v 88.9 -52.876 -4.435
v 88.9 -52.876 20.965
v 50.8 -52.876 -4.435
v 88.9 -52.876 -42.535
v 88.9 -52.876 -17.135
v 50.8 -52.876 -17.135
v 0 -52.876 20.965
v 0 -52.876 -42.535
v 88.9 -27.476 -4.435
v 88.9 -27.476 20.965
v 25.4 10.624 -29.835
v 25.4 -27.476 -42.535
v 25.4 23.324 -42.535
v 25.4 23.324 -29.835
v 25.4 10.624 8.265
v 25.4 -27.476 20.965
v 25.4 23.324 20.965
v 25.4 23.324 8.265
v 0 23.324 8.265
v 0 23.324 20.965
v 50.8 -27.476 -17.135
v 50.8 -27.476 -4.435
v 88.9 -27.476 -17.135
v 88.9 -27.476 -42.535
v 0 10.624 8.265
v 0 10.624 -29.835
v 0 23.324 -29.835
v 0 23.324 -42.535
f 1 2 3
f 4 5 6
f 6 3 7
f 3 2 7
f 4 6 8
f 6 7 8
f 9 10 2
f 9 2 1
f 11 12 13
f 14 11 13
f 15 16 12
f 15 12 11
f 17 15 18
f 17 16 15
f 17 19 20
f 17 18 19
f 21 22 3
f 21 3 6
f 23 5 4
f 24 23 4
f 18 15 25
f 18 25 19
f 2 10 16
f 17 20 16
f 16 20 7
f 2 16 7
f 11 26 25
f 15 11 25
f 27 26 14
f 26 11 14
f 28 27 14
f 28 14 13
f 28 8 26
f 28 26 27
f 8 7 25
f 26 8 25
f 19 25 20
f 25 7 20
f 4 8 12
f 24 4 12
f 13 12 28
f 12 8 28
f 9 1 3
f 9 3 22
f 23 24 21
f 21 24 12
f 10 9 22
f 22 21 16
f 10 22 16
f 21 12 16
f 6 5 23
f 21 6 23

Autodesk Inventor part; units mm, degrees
ref_plane "YZ Plane" through (0, 0, 0) normal (1, 0, 0) x (0, 1, 0)
ref_plane "XZ Plane" through (0, 0, 0) normal (0, 1, 0) x (-1, 0, 0)
ref_plane "XY Plane" through (0, 0, 0) normal (0, 0, 1) x (1, 0, 0)
sketch "Sketch1" plane through (0, 0, 0) normal (1, 0, 0) x (0, 1, 0)
  line L0 (10.6243, 20.9647) -> (-52.8757, 20.9647)
  line L1 (-52.8757, 20.9647) -> (-52.8757, -42.5353)
  line L2 (-52.8757, -42.5353) -> (10.6243, -42.5353)
  line L3 (10.6243, -42.5353) -> (10.6243, 20.9647)
  point P0 (0, 0)
  dimension "d0" = 63.5
  dimension "d1" = 63.5
extrude "Extrusion1" add sketch "Sketch1" along normal blind 25.4
sketch "Sketch2" plane through (25.4, 0, 0) normal (1, 0, 0) x (0, 0, -1)
  line L0 (42.5353, 10.6243) -> (-20.9647, 10.6243) projected
  line L1 (-20.9647, 10.6243) -> (-8.2647, 10.6243)
  line L2 (-8.2647, 10.6243) -> (-8.2647, 23.3243)
  line L3 (-8.2647, 23.3243) -> (-20.9647, 23.3243)
  line L4 (-20.9647, 23.3243) -> (-20.9647, 10.6243)
  line L5 (42.5353, -52.8757) -> (42.5353, 10.6243) projected
  line L6 (42.5353, 10.6243) -> (29.8353, 10.6243)
  line L7 (29.8353, 10.6243) -> (29.8353, 23.3243)
  line L8 (29.8353, 23.3243) -> (42.5353, 23.3243)
  line L9 (42.5353, 23.3243) -> (42.5353, 10.6243)
  point P0 (0, 0)
  dimension "d4" = 12.7
  dimension "d5" = 12.7
  dimension "d6" = 12.7
  dimension "d7" = 12.7
extrude "Extrusion2" add sketch "Sketch2" against normal blind 25.4
sketch "Sketch3" plane through (25.4, 0, 0) normal (1, 0, 0) x (0, 0, -1)
  line L0 (-20.9647, -52.8757) -> (42.5353, -52.8757)
  line L1 (42.5353, -52.8757) -> (42.5353, -27.4757)
  line L2 (42.5353, -27.4757) -> (-20.9647, -27.4757)
  line L3 (-20.9647, -27.4757) -> (-20.9647, -52.8757)
  point P0 (0, 0)
  dimension "d10" = 63.5
  dimension "d11" = 25.4
extrude "Extrusion3" add sketch "Sketch3" along normal blind 63.5
sketch "Sketch4" plane through (88.9, 0, 0) normal (1, 0, 0) x (0, 0, -1)
  line L0 (-20.9647, 23.3243) -> (-20.9647, -52.8757) projected
  line L1 (-20.9647, -52.8757) -> (4.4353, -52.8757)
  line L2 (-20.9647, -52.8757) -> (42.5353, -52.8757) projected
  line L3 (4.4353, -52.8757) -> (4.4353, -27.4757)
  line L4 (42.5353, -27.4757) -> (-20.9647, -27.4757) projected
  line L5 (42.5353, -52.8757) -> (42.5353, -27.4757) projected
  line L6 (42.5353, -52.8757) -> (17.1353, -52.8757)
  line L7 (17.1353, -52.8757) -> (17.1353, -27.4757)
  line L8 (4.4353, -27.4757) -> (17.1353, -27.4757)
  line L9 (17.1353, -27.4757) -> (17.1353, -52.8757)
  line L10 (17.1353, -52.8757) -> (4.4353, -52.8757)
  line L11 (4.4353, -52.8757) -> (4.4353, -27.4757)
  point P0 (0, 0)
  dimension "d14" = 25.4
  dimension "d15" = 25.4
extrude "Extrusion4" cut sketch "Sketch4" against normal blind 38.1 contours L4 L7 L2 L3
properties part number "4.1e P3"
